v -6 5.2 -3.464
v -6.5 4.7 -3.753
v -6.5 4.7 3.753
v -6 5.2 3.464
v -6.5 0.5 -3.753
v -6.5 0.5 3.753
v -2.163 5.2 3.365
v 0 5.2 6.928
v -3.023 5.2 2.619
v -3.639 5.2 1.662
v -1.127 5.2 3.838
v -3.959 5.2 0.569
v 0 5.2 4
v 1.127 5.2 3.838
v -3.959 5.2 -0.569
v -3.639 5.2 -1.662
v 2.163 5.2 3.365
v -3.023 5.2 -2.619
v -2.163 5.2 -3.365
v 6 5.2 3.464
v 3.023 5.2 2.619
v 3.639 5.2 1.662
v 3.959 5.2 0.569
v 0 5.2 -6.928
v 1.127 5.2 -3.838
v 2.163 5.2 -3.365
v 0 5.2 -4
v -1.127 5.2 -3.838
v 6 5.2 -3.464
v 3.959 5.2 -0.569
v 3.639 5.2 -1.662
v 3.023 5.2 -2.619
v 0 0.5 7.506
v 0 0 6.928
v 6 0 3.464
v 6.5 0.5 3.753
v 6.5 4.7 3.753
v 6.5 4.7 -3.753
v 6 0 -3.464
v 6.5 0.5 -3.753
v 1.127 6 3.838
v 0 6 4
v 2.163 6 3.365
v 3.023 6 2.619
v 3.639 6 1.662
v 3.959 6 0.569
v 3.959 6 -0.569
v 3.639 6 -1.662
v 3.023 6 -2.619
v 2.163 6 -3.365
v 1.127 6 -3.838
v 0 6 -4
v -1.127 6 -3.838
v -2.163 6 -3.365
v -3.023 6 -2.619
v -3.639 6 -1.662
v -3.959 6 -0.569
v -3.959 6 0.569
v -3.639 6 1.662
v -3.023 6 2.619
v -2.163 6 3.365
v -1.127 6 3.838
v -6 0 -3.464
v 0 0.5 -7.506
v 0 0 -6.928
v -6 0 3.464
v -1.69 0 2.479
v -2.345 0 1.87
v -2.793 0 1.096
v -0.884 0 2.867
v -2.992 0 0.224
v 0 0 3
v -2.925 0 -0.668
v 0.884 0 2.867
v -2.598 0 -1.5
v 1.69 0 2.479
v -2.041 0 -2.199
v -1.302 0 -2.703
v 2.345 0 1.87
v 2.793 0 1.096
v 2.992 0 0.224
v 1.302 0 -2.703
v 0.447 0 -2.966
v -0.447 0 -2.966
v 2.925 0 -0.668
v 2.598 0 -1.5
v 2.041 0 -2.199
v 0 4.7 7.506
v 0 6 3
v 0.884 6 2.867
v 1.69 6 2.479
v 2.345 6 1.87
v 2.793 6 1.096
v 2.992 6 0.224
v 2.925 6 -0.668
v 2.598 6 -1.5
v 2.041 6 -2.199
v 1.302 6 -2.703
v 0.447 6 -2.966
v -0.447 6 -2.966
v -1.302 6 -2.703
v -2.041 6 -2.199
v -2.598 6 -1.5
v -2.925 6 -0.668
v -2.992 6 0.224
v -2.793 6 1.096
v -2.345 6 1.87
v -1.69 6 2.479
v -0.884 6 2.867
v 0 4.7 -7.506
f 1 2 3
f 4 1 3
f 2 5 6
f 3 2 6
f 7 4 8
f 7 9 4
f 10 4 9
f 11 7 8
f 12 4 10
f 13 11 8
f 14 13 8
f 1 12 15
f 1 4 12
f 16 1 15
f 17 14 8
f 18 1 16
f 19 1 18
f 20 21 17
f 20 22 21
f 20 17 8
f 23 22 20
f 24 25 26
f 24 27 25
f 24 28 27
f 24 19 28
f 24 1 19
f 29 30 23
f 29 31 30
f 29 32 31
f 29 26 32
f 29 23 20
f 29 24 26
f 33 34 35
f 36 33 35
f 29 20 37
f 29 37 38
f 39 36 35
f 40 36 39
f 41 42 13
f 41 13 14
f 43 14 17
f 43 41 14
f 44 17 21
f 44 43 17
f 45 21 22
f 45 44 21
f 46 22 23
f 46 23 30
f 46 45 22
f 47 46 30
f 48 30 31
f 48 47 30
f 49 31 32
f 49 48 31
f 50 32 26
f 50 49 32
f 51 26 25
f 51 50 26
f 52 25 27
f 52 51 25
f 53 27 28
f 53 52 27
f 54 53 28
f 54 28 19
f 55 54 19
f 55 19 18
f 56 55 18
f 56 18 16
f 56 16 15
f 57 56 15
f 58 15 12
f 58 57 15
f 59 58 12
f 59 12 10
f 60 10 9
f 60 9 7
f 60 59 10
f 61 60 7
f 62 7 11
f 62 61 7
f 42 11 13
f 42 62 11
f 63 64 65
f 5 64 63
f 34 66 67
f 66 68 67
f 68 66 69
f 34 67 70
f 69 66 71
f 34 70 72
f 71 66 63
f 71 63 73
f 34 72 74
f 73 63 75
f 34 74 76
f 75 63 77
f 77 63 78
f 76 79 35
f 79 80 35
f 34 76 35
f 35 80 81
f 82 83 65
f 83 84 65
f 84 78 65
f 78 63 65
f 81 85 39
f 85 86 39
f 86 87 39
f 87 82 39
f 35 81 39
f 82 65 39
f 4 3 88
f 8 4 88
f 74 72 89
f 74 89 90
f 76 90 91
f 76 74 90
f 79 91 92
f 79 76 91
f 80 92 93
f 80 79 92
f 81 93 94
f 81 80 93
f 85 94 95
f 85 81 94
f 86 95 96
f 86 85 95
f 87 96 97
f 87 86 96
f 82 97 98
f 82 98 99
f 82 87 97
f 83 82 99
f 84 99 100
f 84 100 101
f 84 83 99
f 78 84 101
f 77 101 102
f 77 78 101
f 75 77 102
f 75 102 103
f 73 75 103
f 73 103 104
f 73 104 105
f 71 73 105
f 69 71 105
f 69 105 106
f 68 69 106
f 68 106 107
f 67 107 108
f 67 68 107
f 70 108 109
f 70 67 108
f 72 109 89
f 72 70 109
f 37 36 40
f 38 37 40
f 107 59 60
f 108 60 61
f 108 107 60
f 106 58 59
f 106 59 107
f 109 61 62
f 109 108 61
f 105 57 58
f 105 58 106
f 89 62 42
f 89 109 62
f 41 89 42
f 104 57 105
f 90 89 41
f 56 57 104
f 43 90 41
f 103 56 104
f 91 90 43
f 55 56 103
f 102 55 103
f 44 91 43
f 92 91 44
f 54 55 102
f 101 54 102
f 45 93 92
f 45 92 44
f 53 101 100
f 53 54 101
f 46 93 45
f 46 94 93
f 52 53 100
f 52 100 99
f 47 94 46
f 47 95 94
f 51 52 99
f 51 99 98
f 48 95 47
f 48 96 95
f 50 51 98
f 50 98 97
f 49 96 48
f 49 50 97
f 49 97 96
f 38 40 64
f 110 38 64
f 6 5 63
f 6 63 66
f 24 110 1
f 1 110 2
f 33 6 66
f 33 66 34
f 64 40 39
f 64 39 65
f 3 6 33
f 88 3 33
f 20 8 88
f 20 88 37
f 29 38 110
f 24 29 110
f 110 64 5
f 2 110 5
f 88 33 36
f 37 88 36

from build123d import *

# Parameters (mm, degrees)
SKETCH1_R           = 3
BOSS_EXTRUDE1_DEPTH = 6
SKETCH3_R           = 4
CUT_EXTRUDE1_DEPTH  = 0.8
CHAMFER1_SIZE       = 0.5


with BuildPart() as part:
    # Sketch1 → Boss-Extrude1 (new body)
    with BuildSketch(Plane(origin=(0, 0, 0), x_dir=(1, 0, 0), z_dir=(0, 1, 0))):
        Polygon((0, -7.505553499), (6.5, -3.75277675), (6.5, 3.75277675), (0, 7.505553499), (-6.5, 3.75277675), (-6.5, -3.75277675), align=None)
        with Locations(Location((0, 0, 0), (0, 0, 270))):
            Circle(SKETCH1_R, mode=Mode.SUBTRACT)
    extrude(amount=BOSS_EXTRUDE1_DEPTH)

    # Sketch3 → Cut-Extrude1 (cut)
    with BuildSketch(Plane(origin=(0, 6, 0), x_dir=(1, 0, 0), z_dir=(0, 1, 0))):
        Polygon((-6.5, -3.75277675), (0, -7.505553499), (6.5, -3.75277675), (6.5, 3.75277675), (0, 7.505553499), (-6.5, 3.75277675), align=None)
        with Locations(Location((0, 0, 0), (0, 0, 270))):
            Circle(SKETCH3_R, mode=Mode.SUBTRACT)
    extrude(amount=-CUT_EXTRUDE1_DEPTH, mode=Mode.SUBTRACT)

    # Chamfer1
    chamfer1_edges = [part.edges().sort_by_distance(p)[0] for p in [
        (-6.5, 5.2, 0),
        (-3.25, 5.2, -5.629165125),
        (3.25, 5.2, -5.629165125),
        (6.5, 5.2, 0),
        (3.25, 5.2, 5.629165125),
        (-3.25, 5.2, 5.629165125),
        (-6.5, 0, 0),
        (-3.25, 0, -5.629165125),
        (3.25, 0, -5.629165125),
        (6.5, 0, 0),
        (3.25, 0, 5.629165125),
        (-3.25, 0, 5.629165125),
    ]]
    chamfer(chamfer1_edges, length=CHAMFER1_SIZE)


solid = part.part
